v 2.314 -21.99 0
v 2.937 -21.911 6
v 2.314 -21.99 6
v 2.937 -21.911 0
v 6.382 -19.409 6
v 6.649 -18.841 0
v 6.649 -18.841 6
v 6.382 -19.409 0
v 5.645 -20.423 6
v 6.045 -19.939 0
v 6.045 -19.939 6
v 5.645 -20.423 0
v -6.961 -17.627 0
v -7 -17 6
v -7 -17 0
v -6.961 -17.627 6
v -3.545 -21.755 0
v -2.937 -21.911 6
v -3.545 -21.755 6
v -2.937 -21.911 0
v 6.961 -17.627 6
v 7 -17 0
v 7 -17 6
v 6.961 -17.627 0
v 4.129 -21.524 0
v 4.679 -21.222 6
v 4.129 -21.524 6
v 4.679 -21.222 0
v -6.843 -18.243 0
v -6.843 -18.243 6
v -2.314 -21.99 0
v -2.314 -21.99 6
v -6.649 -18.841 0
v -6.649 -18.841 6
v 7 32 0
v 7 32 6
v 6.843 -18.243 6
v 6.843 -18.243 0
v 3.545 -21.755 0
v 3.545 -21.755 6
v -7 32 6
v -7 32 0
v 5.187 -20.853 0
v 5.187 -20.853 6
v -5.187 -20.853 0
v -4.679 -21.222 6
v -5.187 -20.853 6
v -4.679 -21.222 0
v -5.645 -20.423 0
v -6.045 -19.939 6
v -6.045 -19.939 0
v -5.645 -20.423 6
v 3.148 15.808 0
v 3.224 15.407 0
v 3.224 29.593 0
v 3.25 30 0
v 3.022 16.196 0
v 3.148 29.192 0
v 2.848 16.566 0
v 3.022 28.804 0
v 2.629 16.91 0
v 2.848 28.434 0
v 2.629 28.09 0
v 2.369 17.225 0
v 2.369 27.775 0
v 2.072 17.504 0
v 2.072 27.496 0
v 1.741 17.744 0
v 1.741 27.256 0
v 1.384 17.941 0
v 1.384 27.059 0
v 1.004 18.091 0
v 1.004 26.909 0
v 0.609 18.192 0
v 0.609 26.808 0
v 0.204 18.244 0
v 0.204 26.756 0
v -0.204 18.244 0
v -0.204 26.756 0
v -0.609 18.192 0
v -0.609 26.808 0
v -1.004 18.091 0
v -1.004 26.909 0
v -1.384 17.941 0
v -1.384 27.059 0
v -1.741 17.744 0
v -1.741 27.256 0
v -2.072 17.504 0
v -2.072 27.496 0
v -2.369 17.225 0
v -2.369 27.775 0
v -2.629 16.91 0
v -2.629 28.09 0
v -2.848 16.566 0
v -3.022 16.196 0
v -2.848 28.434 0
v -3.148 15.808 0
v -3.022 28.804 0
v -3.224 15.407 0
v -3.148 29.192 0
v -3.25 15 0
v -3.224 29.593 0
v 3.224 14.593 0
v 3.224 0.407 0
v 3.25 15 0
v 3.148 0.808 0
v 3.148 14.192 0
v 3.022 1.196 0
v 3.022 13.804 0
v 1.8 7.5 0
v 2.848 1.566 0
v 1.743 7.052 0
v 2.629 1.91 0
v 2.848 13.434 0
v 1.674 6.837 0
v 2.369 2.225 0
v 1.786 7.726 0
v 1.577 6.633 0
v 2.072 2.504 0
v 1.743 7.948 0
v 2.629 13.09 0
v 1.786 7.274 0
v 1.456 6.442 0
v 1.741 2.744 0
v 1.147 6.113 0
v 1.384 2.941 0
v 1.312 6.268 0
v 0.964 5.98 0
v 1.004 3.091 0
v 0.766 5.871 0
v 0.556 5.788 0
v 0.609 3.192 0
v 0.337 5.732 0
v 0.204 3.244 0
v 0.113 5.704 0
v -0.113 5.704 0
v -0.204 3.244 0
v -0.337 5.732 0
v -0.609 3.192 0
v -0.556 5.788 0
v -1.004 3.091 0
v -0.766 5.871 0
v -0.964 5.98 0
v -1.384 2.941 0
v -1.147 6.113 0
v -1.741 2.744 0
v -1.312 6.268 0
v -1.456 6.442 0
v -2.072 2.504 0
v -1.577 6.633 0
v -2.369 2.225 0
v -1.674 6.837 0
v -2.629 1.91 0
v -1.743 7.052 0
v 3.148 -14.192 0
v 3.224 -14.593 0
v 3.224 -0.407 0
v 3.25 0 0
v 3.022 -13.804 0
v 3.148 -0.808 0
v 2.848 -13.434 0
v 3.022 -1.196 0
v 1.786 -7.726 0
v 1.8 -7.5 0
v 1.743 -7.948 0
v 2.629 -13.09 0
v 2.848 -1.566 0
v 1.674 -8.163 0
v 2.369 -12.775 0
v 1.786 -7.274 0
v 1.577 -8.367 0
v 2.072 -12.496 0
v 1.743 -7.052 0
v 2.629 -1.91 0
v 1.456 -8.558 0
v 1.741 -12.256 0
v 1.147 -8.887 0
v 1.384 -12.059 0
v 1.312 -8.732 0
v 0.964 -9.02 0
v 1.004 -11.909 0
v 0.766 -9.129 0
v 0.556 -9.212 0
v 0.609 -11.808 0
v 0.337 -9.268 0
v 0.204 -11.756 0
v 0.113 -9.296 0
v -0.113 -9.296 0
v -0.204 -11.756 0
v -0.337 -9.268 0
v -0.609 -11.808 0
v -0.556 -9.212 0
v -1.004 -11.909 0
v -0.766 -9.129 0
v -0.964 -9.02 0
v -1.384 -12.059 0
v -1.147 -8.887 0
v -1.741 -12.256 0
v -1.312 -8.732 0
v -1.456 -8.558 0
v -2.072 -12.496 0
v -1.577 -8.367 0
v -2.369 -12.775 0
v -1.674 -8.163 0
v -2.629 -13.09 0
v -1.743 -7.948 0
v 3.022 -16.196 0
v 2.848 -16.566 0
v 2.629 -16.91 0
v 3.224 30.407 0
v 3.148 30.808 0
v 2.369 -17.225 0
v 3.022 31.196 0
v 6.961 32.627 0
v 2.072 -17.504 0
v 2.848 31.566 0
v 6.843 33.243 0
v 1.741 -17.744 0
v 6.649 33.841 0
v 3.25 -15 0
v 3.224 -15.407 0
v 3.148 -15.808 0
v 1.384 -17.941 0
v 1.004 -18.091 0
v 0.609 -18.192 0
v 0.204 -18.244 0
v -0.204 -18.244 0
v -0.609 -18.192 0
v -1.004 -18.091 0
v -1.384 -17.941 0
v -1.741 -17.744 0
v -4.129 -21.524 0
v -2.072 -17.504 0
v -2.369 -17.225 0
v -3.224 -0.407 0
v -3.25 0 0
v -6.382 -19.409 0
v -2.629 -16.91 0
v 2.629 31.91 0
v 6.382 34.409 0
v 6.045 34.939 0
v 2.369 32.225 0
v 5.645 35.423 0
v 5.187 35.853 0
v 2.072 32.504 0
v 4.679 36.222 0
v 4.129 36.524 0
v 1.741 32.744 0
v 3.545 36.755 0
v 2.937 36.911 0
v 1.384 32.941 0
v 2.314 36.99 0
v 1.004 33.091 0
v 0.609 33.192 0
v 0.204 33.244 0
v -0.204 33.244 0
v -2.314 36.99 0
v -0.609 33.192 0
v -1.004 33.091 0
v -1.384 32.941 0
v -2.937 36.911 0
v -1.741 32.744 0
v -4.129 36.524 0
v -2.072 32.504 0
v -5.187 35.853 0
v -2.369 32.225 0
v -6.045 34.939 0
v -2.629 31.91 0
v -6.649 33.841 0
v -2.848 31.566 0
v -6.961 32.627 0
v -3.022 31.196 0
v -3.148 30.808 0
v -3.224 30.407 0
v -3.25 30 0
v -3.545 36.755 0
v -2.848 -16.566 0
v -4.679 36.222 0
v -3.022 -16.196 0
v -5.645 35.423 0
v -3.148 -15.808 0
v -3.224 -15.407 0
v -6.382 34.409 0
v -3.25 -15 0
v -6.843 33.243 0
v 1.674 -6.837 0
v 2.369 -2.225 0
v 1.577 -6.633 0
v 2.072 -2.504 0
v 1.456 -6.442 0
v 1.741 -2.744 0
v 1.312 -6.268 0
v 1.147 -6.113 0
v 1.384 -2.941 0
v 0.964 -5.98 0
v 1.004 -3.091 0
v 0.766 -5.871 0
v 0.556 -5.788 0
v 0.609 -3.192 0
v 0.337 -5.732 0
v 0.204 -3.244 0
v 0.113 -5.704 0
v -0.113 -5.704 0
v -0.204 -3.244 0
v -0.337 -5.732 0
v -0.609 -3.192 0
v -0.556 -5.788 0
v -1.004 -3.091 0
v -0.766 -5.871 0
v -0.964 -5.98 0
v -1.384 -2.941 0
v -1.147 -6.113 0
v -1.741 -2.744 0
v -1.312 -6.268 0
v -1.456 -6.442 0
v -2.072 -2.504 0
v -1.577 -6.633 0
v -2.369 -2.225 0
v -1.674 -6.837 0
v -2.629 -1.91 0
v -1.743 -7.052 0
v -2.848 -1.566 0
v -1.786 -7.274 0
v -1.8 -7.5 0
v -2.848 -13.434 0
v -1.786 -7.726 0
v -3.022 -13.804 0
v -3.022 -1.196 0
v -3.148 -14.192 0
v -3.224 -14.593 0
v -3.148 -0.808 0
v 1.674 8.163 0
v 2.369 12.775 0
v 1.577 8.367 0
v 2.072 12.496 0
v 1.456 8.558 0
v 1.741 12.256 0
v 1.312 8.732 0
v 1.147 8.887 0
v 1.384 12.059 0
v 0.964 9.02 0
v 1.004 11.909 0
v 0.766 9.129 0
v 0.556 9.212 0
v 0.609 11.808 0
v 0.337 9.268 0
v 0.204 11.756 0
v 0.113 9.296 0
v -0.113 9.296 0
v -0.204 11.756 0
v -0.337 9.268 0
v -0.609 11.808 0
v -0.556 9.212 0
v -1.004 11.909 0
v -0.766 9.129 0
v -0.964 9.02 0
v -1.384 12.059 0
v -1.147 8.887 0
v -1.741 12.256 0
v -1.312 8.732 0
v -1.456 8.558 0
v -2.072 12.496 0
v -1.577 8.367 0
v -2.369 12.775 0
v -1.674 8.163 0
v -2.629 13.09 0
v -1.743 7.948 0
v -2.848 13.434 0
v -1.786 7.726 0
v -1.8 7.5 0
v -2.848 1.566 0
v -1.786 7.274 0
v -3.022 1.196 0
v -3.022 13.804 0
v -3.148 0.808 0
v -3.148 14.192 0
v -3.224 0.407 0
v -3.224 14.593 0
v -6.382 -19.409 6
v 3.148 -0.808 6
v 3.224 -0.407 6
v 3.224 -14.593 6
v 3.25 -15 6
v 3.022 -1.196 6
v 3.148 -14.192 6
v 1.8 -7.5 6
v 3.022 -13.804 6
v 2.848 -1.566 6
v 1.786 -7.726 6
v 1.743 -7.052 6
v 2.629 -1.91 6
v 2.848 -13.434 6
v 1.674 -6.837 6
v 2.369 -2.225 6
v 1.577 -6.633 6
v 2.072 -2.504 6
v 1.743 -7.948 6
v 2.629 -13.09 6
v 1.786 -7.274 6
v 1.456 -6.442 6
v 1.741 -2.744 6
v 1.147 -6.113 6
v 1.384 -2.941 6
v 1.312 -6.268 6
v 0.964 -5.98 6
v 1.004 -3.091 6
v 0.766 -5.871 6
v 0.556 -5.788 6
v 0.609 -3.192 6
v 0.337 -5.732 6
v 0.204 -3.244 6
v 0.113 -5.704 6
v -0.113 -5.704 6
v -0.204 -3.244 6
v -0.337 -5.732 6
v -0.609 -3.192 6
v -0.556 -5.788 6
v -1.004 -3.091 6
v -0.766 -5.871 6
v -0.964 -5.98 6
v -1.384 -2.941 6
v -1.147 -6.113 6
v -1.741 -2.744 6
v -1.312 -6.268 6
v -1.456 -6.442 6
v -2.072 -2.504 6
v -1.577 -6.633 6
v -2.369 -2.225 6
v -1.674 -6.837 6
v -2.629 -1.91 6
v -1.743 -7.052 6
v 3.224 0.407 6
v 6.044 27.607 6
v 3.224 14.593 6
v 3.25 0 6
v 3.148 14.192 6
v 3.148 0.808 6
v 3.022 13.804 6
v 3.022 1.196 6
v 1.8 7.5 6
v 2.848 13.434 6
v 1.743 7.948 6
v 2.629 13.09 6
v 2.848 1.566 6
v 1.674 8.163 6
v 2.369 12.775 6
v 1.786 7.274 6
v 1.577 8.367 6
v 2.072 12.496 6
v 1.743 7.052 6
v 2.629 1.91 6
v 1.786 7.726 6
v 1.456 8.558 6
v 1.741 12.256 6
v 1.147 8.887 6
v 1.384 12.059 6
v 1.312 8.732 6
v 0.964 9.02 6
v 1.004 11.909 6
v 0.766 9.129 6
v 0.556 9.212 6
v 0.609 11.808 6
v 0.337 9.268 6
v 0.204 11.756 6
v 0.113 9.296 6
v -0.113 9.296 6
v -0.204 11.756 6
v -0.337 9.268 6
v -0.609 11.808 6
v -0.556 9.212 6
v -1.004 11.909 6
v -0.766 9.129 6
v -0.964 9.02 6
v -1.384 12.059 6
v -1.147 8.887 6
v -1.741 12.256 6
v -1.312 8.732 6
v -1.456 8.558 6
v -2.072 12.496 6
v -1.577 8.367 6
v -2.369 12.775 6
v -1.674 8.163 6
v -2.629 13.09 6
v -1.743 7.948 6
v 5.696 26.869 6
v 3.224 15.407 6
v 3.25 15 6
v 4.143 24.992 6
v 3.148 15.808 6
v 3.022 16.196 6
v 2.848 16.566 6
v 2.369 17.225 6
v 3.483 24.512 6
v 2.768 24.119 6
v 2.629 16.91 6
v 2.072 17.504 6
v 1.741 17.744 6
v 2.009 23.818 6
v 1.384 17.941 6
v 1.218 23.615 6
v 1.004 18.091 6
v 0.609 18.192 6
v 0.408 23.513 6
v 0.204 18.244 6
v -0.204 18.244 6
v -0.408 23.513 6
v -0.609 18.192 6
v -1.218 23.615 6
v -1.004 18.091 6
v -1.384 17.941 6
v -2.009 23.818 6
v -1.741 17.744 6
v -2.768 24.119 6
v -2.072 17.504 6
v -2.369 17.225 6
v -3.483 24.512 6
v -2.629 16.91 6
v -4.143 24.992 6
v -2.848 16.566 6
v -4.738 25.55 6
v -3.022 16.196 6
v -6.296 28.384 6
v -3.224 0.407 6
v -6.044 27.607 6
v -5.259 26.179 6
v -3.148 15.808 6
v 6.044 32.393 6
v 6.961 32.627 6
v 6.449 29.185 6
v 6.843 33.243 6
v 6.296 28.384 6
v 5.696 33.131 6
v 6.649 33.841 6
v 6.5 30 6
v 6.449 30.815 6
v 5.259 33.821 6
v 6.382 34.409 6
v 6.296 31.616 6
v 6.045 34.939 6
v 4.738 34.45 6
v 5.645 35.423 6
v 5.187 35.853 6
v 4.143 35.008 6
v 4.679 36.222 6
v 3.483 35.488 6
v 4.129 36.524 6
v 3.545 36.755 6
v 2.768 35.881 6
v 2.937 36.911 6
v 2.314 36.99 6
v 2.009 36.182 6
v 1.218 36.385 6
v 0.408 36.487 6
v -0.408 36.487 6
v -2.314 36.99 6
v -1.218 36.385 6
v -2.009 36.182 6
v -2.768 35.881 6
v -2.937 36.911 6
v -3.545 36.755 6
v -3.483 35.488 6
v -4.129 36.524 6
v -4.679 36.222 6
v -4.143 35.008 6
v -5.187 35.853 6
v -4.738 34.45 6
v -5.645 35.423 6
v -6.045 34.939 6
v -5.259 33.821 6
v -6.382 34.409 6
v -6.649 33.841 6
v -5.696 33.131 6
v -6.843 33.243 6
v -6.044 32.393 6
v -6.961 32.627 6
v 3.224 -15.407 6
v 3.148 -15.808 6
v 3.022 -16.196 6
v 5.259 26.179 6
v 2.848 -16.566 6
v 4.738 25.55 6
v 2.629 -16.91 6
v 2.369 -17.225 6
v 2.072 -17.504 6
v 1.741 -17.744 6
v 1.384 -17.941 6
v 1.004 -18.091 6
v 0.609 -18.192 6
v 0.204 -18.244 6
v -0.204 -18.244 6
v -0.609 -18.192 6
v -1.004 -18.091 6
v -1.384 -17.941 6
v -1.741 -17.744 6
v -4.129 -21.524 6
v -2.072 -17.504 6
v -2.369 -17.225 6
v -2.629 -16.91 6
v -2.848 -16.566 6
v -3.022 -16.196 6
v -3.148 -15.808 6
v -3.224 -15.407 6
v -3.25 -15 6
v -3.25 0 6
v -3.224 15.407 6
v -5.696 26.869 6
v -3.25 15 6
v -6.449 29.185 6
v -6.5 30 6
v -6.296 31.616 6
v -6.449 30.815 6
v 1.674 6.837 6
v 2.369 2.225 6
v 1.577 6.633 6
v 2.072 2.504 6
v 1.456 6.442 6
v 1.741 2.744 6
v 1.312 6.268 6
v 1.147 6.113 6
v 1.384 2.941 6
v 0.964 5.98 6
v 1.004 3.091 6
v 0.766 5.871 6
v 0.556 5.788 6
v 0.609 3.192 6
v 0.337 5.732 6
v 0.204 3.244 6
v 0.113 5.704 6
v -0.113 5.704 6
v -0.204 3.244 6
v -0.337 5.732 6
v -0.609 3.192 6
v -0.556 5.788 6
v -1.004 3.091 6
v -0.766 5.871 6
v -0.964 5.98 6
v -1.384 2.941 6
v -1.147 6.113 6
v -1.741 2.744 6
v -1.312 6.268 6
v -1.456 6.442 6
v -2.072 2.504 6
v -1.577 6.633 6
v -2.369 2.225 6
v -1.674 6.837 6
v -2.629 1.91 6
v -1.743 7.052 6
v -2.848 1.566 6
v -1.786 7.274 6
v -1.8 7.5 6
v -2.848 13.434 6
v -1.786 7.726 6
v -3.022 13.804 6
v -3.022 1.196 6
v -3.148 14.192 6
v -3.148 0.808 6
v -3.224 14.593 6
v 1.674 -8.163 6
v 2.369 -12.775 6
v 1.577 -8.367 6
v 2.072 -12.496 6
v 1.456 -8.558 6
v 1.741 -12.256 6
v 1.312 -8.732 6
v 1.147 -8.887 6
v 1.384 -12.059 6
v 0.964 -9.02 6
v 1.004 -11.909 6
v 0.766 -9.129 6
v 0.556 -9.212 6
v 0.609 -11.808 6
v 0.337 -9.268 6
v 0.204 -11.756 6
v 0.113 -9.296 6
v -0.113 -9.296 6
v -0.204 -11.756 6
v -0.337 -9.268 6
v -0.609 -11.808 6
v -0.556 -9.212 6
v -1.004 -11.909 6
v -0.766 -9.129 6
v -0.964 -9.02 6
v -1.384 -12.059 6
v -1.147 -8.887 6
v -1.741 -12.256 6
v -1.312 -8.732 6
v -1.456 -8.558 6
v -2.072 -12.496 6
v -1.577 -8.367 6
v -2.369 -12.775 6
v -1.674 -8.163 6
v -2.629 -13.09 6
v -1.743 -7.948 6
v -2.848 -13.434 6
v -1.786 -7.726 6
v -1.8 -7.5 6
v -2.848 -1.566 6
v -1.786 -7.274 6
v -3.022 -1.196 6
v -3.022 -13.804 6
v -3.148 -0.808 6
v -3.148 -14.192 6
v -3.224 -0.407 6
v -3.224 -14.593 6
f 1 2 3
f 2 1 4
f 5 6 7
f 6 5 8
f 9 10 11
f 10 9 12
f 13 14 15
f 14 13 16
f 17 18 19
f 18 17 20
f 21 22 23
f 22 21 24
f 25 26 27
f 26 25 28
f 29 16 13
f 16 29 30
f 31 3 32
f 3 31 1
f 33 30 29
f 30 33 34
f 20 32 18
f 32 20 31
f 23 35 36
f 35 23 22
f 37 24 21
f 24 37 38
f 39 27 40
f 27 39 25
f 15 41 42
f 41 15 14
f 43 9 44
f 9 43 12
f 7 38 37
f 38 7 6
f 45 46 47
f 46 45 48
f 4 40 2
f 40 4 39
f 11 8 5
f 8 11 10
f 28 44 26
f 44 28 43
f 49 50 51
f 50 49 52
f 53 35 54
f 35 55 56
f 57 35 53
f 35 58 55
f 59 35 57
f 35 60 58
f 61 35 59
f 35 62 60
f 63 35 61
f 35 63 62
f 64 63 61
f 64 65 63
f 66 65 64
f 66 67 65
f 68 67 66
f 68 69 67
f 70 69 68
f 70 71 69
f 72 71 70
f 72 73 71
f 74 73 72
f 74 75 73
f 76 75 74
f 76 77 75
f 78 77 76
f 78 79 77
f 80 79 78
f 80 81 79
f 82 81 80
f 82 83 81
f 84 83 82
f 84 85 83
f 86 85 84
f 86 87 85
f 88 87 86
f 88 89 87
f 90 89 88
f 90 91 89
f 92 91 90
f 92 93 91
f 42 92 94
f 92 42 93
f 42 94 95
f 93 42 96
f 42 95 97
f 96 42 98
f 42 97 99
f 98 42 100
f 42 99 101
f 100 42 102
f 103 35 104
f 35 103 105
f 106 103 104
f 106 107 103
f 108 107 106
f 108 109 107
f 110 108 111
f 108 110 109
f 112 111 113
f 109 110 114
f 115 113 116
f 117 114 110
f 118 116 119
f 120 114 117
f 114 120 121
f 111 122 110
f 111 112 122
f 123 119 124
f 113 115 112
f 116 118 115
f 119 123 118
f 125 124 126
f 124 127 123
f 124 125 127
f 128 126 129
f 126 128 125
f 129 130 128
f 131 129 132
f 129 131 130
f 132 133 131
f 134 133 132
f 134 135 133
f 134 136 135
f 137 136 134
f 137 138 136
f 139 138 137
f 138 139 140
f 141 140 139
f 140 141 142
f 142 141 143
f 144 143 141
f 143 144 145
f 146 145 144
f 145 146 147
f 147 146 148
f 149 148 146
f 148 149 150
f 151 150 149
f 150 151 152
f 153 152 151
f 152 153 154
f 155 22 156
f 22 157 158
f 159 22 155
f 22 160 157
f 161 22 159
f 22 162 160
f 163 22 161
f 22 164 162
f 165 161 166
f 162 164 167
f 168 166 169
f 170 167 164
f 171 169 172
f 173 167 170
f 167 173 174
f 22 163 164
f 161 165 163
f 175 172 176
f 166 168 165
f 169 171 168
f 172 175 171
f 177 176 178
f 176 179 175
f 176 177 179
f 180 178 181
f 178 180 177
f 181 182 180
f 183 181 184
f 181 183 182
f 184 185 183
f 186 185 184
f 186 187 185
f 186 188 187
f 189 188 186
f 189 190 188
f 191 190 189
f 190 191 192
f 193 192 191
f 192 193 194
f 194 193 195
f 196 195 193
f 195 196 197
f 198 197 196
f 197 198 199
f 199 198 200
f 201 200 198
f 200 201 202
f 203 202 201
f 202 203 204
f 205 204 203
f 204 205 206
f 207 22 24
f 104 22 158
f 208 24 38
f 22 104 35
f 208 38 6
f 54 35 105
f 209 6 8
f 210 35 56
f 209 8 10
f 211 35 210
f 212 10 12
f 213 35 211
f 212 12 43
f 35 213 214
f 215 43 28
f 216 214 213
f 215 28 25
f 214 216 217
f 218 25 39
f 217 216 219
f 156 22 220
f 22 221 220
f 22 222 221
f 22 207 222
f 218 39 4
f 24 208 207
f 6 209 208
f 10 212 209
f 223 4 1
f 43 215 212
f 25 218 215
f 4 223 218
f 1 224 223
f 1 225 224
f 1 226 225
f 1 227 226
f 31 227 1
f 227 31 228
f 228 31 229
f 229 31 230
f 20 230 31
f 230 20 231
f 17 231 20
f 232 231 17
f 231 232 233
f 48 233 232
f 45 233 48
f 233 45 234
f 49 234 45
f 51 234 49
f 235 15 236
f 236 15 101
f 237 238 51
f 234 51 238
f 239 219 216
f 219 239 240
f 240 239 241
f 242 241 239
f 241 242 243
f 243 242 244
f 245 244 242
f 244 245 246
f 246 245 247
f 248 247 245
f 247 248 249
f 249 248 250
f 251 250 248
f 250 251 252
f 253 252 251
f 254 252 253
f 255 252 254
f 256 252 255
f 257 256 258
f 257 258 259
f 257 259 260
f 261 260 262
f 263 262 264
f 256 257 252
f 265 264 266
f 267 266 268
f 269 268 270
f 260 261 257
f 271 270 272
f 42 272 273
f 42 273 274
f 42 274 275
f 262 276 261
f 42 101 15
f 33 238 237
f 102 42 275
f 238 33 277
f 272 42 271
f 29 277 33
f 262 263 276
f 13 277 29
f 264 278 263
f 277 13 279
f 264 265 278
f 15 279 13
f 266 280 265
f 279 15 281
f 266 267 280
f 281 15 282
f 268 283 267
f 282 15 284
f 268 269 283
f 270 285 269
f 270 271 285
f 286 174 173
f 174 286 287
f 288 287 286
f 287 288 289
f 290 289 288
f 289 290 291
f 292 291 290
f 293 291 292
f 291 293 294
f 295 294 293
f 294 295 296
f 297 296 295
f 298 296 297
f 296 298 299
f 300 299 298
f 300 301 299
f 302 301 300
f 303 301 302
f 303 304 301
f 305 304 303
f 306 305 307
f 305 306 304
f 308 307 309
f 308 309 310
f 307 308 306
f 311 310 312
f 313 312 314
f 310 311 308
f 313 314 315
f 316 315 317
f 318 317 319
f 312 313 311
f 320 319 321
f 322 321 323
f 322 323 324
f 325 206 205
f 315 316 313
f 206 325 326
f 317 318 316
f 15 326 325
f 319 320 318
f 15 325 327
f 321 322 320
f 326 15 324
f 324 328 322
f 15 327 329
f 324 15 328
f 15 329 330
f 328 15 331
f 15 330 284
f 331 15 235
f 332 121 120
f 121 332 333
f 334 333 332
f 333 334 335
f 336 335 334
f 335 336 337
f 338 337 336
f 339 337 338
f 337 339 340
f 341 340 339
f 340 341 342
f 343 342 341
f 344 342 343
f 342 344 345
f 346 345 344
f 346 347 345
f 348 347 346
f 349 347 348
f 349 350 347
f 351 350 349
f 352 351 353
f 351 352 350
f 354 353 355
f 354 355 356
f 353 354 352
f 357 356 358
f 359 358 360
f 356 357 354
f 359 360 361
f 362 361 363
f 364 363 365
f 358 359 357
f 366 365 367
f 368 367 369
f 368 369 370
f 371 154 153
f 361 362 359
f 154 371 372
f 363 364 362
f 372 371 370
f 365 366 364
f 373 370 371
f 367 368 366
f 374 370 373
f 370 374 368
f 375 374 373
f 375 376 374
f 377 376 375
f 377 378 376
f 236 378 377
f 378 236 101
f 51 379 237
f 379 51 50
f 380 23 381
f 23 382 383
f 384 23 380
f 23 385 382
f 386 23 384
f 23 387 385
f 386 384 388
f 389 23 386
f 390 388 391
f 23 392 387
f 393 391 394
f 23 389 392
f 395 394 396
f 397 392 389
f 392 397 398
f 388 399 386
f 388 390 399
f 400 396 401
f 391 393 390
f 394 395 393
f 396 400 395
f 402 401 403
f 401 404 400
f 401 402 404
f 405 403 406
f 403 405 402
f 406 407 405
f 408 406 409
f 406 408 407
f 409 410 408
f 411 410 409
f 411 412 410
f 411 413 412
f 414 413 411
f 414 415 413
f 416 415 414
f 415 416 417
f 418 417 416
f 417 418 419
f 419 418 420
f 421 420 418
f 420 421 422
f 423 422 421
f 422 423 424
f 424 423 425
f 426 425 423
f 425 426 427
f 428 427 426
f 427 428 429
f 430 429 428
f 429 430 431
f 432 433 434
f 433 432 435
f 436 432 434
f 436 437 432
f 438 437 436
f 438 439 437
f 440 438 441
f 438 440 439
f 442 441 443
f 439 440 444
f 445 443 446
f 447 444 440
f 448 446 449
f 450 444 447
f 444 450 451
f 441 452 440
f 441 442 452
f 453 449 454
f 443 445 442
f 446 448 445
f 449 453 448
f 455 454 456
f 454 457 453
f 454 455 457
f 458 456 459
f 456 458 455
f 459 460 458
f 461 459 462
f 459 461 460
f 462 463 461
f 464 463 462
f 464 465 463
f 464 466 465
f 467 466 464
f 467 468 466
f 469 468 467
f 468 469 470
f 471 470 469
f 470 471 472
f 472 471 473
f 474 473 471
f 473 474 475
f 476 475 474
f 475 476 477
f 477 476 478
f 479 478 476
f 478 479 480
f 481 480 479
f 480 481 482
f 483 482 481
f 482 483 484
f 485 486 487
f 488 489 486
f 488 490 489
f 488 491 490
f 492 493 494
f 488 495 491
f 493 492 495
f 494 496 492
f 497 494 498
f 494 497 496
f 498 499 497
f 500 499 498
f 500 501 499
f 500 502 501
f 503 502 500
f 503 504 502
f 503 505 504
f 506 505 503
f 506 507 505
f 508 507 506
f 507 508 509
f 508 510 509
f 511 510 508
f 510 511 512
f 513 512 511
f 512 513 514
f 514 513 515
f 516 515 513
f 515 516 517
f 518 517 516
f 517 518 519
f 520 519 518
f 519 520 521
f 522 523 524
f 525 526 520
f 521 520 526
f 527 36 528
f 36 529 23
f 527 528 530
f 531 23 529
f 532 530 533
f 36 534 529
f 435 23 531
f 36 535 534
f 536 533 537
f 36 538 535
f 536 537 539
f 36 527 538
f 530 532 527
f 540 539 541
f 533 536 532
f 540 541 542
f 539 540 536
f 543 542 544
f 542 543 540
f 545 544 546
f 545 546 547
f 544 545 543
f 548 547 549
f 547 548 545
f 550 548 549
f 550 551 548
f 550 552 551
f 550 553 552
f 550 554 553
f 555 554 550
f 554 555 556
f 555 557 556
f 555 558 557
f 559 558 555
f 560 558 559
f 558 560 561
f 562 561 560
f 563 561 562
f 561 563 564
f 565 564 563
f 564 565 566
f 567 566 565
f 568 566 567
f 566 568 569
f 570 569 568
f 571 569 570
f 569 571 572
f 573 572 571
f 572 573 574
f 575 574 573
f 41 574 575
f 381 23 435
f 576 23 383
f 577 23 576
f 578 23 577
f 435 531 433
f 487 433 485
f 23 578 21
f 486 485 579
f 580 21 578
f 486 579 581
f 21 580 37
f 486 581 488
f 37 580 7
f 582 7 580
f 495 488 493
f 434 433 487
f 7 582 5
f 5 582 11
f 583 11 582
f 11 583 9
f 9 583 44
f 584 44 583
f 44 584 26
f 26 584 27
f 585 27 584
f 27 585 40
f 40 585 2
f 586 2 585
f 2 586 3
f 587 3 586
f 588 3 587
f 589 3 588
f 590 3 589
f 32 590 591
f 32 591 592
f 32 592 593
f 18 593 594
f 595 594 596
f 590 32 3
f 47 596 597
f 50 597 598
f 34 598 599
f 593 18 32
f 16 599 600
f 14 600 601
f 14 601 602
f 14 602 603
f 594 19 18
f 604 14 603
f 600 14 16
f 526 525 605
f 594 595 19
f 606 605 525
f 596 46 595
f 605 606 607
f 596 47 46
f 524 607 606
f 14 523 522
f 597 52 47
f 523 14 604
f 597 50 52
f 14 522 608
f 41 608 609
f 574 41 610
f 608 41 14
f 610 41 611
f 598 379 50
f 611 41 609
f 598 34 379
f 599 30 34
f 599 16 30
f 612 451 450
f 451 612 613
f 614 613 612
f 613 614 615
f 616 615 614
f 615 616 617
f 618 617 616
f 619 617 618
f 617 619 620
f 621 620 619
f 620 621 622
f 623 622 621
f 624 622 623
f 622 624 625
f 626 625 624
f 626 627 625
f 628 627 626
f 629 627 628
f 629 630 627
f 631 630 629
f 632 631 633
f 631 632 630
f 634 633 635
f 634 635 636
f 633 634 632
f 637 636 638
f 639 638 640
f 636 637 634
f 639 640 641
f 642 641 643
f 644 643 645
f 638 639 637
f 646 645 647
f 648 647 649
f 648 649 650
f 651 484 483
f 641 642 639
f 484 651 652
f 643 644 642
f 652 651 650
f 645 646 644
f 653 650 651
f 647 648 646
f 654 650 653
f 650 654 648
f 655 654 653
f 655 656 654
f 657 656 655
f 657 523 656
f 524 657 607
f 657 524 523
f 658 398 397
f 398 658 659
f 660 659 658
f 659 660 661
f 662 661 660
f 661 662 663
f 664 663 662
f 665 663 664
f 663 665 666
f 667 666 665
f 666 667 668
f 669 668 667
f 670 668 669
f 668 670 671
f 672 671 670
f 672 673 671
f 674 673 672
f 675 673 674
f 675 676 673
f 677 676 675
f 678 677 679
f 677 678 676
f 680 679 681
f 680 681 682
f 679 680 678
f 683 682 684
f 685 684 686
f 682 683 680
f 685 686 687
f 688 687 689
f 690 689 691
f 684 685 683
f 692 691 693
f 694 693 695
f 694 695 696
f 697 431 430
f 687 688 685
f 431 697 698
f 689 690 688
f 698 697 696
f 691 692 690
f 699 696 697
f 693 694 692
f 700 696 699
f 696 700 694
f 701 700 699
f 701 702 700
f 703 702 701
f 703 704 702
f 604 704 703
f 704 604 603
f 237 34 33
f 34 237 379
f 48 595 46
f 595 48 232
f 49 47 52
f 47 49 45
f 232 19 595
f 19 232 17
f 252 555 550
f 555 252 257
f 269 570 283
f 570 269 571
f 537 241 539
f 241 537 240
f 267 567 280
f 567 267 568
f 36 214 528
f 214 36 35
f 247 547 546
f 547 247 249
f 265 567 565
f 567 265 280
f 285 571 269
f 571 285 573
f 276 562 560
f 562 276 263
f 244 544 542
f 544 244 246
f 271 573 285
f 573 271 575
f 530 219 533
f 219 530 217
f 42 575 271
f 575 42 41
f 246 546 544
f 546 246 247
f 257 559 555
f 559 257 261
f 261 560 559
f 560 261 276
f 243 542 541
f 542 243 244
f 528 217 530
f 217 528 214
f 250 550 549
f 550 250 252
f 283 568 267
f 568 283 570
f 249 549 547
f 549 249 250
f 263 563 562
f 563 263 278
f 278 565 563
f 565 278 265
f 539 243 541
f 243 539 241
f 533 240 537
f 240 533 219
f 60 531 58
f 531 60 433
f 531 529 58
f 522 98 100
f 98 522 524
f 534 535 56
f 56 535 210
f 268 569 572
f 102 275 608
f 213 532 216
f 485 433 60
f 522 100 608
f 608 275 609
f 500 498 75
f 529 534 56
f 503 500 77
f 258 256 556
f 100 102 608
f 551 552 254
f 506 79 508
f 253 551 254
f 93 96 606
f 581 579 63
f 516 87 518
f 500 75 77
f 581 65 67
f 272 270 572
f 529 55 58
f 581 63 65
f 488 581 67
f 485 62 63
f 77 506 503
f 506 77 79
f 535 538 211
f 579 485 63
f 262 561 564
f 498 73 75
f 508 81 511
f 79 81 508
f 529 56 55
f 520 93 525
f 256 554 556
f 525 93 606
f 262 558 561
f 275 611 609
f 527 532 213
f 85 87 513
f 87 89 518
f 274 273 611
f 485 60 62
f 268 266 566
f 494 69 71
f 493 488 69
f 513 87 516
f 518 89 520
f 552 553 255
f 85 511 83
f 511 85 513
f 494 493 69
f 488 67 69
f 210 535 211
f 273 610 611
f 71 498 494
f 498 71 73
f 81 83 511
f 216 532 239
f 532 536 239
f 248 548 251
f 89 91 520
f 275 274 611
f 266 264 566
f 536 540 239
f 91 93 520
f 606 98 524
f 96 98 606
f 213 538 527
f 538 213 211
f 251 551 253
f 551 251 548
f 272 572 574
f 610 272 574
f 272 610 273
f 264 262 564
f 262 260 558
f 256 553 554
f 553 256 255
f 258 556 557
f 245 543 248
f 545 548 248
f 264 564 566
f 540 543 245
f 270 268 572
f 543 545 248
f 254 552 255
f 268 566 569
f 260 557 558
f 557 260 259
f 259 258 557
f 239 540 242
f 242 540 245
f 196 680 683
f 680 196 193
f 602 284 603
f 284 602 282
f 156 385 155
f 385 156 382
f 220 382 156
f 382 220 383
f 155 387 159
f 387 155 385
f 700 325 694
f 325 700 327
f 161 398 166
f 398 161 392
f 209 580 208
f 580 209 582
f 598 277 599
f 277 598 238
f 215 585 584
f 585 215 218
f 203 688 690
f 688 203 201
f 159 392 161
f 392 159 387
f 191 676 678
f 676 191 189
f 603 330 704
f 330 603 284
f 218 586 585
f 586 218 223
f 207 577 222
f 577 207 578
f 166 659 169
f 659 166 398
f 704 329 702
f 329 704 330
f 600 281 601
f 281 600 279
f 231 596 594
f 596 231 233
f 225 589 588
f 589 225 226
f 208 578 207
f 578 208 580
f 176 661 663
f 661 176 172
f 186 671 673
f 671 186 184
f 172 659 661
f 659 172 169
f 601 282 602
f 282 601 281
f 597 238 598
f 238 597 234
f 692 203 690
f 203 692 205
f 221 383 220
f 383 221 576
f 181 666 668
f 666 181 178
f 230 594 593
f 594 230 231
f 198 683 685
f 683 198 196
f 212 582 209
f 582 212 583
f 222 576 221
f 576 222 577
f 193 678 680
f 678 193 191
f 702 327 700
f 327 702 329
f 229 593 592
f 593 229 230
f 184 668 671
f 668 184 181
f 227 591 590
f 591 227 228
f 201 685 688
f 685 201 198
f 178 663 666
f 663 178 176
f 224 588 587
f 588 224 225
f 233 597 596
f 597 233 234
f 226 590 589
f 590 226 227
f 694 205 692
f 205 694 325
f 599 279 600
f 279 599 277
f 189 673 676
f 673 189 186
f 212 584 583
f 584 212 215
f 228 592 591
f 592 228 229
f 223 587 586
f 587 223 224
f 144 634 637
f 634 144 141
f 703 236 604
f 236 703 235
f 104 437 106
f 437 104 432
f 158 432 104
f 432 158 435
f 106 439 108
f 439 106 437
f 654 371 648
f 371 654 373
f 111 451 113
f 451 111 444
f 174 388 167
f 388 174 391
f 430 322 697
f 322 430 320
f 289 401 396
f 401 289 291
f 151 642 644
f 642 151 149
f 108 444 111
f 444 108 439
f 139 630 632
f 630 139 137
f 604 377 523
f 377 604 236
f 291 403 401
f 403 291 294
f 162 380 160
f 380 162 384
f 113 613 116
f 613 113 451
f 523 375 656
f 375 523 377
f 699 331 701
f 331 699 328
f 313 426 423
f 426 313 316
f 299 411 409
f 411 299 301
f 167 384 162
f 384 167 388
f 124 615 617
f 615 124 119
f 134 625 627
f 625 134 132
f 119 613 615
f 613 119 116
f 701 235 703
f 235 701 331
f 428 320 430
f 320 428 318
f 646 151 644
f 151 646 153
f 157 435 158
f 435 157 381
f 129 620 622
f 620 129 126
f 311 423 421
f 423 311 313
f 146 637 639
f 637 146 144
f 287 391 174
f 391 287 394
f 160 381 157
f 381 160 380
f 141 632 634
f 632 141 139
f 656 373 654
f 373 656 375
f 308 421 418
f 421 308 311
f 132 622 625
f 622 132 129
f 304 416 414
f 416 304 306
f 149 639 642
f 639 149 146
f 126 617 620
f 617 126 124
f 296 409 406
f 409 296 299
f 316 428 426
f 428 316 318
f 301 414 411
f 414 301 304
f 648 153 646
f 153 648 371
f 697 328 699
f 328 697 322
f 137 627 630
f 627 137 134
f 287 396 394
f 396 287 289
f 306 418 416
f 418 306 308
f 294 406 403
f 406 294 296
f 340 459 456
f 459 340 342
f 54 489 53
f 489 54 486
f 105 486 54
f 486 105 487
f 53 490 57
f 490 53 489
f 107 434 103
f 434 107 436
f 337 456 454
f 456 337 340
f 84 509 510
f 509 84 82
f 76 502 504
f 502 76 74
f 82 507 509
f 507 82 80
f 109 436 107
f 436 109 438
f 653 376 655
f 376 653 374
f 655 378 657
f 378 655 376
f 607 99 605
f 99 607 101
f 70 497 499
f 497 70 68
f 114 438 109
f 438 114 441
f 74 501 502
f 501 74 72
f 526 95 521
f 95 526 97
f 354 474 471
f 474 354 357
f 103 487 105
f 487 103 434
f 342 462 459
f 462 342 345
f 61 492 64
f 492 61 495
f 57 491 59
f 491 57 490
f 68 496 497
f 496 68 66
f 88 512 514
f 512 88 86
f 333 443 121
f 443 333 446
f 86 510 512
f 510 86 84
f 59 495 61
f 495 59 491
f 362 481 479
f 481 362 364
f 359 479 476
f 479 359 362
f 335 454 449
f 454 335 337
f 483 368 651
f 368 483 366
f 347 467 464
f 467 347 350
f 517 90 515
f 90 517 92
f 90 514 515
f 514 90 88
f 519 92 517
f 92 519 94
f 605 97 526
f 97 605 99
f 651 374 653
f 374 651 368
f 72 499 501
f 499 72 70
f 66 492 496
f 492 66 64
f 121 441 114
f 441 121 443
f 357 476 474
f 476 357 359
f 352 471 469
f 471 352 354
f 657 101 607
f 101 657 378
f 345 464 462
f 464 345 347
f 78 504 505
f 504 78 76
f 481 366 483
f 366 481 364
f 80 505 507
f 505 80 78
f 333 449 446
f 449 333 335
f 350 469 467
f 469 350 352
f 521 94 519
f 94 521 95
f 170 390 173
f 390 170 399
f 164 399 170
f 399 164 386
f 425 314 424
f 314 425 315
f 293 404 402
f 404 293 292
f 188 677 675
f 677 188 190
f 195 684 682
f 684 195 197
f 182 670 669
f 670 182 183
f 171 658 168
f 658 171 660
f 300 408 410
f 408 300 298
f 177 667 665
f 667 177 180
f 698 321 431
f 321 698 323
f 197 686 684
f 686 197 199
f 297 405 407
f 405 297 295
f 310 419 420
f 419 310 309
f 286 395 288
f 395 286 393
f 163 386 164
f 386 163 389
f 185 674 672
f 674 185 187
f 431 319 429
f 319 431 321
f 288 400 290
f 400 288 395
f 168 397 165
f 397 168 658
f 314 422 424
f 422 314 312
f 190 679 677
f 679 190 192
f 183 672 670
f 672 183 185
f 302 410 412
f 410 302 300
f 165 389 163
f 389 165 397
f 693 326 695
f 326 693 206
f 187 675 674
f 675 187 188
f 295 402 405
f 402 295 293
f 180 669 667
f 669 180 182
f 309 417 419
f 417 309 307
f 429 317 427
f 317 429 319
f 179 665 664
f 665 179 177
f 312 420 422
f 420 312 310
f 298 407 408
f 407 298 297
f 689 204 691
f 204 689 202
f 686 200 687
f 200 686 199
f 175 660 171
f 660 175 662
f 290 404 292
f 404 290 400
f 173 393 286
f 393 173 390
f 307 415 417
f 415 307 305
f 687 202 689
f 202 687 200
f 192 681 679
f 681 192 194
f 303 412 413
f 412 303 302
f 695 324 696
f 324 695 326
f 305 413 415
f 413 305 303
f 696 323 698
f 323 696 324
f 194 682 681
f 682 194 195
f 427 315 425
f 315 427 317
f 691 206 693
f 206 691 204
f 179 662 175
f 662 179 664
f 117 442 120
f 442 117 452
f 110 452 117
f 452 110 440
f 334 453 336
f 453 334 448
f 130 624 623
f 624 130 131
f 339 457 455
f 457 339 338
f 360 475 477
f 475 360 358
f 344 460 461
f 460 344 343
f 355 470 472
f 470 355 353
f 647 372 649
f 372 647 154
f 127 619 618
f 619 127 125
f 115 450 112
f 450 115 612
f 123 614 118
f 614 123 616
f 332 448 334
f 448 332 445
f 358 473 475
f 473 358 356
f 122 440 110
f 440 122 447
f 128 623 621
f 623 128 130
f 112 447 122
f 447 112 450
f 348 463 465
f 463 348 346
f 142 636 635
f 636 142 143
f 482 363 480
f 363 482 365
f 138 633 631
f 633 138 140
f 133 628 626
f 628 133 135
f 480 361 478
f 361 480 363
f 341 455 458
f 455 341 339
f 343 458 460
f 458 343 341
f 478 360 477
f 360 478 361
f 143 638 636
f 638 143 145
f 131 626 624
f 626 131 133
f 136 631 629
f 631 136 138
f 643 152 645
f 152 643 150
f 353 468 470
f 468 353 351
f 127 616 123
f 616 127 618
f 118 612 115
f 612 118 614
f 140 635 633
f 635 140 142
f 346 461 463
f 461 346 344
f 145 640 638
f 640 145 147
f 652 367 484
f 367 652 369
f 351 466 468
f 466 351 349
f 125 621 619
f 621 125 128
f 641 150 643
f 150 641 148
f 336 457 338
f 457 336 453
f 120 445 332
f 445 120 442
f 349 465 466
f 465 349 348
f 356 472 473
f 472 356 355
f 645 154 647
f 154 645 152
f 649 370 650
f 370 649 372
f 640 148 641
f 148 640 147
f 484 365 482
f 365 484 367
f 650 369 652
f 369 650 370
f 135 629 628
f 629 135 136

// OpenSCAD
$fn = 50;


difference() {
	union() {
		hull() {
			translate(v = [-2.0000000000, 17.0000000000, 0]) {
				cylinder(h = 6, r = 5);
			}
			translate(v = [2.0000000000, 17.0000000000, 0]) {
				cylinder(h = 6, r = 5);
			}
			translate(v = [-2.0000000000, -17.0000000000, 0]) {
				cylinder(h = 6, r = 5);
			}
			translate(v = [2.0000000000, -17.0000000000, 0]) {
				cylinder(h = 6, r = 5);
			}
		}
		translate(v = [0.0000000000, 22.5000000000, 0]) {
			hull() {
				translate(v = [-2.0000000000, 9.5000000000, 0]) {
					cylinder(h = 6, r = 5);
				}
				translate(v = [2.0000000000, 9.5000000000, 0]) {
					cylinder(h = 6, r = 5);
				}
				translate(v = [-2.0000000000, -9.5000000000, 0]) {
					cylinder(h = 6, r = 5);
				}
				translate(v = [2.0000000000, -9.5000000000, 0]) {
					cylinder(h = 6, r = 5);
				}
			}
		}
		translate(v = [0.0000000000, 22.5000000000, 0]) {
			hull() {
				translate(v = [-2.0000000000, 9.5000000000, 0]) {
					cylinder(h = 6, r = 5);
				}
				translate(v = [2.0000000000, 9.5000000000, 0]) {
					cylinder(h = 6, r = 5);
				}
				translate(v = [-2.0000000000, -9.5000000000, 0]) {
					cylinder(h = 6, r = 5);
				}
				translate(v = [2.0000000000, -9.5000000000, 0]) {
					cylinder(h = 6, r = 5);
				}
			}
		}
	}
	union() {
		translate(v = [0.0000000000, 30.0000000000, 6]) {
			rotate(a = [0, 0, 0]) {
				difference() {
					union() {
						#translate(v = [0, 0, -6.0000000000]) {
							cylinder(h = 6, r = 2.2500000000);
						}
						#translate(v = [0, 0, -6]) {
							cylinder(h = 6, r1 = 3.2500000000, r2 = 6.5000000000);
						}
						#translate(v = [0, 0, -6.0000000000]) {
							cylinder(h = 6, r = 3.2500000000);
						}
						#translate(v = [0, 0, -6.0000000000]) {
							cylinder(h = 6, r = 2.2500000000);
						}
					}
					union();
				}
			}
		}
		translate(v = [0.0000000000, 30.0000000000, 6]) {
			rotate(a = [0, 0, 0]) {
				difference() {
					union() {
						#translate(v = [0, 0, -6.0000000000]) {
							cylinder(h = 6, r = 2.2500000000);
						}
						#translate(v = [0, 0, -6]) {
							cylinder(h = 6, r1 = 3.2500000000, r2 = 6.5000000000);
						}
						#translate(v = [0, 0, -6.0000000000]) {
							cylinder(h = 6, r = 3.2500000000);
						}
						#translate(v = [0, 0, -6.0000000000]) {
							cylinder(h = 6, r = 2.2500000000);
						}
					}
					union();
				}
			}
		}
		translate(v = [0.0000000000, -15.0000000000, 0]) {
			translate(v = [0, 0, -100]) {
				cylinder(h = 200, r = 3.2500000000);
			}
		}
		translate(v = [0, 0, -100]) {
			cylinder(h = 200, r = 3.2500000000);
		}
		translate(v = [0.0000000000, 15.0000000000, 0]) {
			translate(v = [0, 0, -100]) {
				cylinder(h = 200, r = 3.2500000000);
			}
		}
		translate(v = [0.0000000000, -15.0000000000, 0]) {
			translate(v = [0, 0, -100]) {
				cylinder(h = 200, r = 1.8000000000);
			}
		}
		translate(v = [0.0000000000, -7.5000000000, 0]) {
			translate(v = [0, 0, -100]) {
				cylinder(h = 200, r = 1.8000000000);
			}
		}
		translate(v = [0, 0, -100]) {
			cylinder(h = 200, r = 1.8000000000);
		}
		translate(v = [0.0000000000, 7.5000000000, 0]) {
			translate(v = [0, 0, -100]) {
				cylinder(h = 200, r = 1.8000000000);
			}
		}
		translate(v = [0.0000000000, 15.0000000000, 0]) {
			translate(v = [0, 0, -100]) {
				cylinder(h = 200, r = 1.8000000000);
			}
		}
	}
}
